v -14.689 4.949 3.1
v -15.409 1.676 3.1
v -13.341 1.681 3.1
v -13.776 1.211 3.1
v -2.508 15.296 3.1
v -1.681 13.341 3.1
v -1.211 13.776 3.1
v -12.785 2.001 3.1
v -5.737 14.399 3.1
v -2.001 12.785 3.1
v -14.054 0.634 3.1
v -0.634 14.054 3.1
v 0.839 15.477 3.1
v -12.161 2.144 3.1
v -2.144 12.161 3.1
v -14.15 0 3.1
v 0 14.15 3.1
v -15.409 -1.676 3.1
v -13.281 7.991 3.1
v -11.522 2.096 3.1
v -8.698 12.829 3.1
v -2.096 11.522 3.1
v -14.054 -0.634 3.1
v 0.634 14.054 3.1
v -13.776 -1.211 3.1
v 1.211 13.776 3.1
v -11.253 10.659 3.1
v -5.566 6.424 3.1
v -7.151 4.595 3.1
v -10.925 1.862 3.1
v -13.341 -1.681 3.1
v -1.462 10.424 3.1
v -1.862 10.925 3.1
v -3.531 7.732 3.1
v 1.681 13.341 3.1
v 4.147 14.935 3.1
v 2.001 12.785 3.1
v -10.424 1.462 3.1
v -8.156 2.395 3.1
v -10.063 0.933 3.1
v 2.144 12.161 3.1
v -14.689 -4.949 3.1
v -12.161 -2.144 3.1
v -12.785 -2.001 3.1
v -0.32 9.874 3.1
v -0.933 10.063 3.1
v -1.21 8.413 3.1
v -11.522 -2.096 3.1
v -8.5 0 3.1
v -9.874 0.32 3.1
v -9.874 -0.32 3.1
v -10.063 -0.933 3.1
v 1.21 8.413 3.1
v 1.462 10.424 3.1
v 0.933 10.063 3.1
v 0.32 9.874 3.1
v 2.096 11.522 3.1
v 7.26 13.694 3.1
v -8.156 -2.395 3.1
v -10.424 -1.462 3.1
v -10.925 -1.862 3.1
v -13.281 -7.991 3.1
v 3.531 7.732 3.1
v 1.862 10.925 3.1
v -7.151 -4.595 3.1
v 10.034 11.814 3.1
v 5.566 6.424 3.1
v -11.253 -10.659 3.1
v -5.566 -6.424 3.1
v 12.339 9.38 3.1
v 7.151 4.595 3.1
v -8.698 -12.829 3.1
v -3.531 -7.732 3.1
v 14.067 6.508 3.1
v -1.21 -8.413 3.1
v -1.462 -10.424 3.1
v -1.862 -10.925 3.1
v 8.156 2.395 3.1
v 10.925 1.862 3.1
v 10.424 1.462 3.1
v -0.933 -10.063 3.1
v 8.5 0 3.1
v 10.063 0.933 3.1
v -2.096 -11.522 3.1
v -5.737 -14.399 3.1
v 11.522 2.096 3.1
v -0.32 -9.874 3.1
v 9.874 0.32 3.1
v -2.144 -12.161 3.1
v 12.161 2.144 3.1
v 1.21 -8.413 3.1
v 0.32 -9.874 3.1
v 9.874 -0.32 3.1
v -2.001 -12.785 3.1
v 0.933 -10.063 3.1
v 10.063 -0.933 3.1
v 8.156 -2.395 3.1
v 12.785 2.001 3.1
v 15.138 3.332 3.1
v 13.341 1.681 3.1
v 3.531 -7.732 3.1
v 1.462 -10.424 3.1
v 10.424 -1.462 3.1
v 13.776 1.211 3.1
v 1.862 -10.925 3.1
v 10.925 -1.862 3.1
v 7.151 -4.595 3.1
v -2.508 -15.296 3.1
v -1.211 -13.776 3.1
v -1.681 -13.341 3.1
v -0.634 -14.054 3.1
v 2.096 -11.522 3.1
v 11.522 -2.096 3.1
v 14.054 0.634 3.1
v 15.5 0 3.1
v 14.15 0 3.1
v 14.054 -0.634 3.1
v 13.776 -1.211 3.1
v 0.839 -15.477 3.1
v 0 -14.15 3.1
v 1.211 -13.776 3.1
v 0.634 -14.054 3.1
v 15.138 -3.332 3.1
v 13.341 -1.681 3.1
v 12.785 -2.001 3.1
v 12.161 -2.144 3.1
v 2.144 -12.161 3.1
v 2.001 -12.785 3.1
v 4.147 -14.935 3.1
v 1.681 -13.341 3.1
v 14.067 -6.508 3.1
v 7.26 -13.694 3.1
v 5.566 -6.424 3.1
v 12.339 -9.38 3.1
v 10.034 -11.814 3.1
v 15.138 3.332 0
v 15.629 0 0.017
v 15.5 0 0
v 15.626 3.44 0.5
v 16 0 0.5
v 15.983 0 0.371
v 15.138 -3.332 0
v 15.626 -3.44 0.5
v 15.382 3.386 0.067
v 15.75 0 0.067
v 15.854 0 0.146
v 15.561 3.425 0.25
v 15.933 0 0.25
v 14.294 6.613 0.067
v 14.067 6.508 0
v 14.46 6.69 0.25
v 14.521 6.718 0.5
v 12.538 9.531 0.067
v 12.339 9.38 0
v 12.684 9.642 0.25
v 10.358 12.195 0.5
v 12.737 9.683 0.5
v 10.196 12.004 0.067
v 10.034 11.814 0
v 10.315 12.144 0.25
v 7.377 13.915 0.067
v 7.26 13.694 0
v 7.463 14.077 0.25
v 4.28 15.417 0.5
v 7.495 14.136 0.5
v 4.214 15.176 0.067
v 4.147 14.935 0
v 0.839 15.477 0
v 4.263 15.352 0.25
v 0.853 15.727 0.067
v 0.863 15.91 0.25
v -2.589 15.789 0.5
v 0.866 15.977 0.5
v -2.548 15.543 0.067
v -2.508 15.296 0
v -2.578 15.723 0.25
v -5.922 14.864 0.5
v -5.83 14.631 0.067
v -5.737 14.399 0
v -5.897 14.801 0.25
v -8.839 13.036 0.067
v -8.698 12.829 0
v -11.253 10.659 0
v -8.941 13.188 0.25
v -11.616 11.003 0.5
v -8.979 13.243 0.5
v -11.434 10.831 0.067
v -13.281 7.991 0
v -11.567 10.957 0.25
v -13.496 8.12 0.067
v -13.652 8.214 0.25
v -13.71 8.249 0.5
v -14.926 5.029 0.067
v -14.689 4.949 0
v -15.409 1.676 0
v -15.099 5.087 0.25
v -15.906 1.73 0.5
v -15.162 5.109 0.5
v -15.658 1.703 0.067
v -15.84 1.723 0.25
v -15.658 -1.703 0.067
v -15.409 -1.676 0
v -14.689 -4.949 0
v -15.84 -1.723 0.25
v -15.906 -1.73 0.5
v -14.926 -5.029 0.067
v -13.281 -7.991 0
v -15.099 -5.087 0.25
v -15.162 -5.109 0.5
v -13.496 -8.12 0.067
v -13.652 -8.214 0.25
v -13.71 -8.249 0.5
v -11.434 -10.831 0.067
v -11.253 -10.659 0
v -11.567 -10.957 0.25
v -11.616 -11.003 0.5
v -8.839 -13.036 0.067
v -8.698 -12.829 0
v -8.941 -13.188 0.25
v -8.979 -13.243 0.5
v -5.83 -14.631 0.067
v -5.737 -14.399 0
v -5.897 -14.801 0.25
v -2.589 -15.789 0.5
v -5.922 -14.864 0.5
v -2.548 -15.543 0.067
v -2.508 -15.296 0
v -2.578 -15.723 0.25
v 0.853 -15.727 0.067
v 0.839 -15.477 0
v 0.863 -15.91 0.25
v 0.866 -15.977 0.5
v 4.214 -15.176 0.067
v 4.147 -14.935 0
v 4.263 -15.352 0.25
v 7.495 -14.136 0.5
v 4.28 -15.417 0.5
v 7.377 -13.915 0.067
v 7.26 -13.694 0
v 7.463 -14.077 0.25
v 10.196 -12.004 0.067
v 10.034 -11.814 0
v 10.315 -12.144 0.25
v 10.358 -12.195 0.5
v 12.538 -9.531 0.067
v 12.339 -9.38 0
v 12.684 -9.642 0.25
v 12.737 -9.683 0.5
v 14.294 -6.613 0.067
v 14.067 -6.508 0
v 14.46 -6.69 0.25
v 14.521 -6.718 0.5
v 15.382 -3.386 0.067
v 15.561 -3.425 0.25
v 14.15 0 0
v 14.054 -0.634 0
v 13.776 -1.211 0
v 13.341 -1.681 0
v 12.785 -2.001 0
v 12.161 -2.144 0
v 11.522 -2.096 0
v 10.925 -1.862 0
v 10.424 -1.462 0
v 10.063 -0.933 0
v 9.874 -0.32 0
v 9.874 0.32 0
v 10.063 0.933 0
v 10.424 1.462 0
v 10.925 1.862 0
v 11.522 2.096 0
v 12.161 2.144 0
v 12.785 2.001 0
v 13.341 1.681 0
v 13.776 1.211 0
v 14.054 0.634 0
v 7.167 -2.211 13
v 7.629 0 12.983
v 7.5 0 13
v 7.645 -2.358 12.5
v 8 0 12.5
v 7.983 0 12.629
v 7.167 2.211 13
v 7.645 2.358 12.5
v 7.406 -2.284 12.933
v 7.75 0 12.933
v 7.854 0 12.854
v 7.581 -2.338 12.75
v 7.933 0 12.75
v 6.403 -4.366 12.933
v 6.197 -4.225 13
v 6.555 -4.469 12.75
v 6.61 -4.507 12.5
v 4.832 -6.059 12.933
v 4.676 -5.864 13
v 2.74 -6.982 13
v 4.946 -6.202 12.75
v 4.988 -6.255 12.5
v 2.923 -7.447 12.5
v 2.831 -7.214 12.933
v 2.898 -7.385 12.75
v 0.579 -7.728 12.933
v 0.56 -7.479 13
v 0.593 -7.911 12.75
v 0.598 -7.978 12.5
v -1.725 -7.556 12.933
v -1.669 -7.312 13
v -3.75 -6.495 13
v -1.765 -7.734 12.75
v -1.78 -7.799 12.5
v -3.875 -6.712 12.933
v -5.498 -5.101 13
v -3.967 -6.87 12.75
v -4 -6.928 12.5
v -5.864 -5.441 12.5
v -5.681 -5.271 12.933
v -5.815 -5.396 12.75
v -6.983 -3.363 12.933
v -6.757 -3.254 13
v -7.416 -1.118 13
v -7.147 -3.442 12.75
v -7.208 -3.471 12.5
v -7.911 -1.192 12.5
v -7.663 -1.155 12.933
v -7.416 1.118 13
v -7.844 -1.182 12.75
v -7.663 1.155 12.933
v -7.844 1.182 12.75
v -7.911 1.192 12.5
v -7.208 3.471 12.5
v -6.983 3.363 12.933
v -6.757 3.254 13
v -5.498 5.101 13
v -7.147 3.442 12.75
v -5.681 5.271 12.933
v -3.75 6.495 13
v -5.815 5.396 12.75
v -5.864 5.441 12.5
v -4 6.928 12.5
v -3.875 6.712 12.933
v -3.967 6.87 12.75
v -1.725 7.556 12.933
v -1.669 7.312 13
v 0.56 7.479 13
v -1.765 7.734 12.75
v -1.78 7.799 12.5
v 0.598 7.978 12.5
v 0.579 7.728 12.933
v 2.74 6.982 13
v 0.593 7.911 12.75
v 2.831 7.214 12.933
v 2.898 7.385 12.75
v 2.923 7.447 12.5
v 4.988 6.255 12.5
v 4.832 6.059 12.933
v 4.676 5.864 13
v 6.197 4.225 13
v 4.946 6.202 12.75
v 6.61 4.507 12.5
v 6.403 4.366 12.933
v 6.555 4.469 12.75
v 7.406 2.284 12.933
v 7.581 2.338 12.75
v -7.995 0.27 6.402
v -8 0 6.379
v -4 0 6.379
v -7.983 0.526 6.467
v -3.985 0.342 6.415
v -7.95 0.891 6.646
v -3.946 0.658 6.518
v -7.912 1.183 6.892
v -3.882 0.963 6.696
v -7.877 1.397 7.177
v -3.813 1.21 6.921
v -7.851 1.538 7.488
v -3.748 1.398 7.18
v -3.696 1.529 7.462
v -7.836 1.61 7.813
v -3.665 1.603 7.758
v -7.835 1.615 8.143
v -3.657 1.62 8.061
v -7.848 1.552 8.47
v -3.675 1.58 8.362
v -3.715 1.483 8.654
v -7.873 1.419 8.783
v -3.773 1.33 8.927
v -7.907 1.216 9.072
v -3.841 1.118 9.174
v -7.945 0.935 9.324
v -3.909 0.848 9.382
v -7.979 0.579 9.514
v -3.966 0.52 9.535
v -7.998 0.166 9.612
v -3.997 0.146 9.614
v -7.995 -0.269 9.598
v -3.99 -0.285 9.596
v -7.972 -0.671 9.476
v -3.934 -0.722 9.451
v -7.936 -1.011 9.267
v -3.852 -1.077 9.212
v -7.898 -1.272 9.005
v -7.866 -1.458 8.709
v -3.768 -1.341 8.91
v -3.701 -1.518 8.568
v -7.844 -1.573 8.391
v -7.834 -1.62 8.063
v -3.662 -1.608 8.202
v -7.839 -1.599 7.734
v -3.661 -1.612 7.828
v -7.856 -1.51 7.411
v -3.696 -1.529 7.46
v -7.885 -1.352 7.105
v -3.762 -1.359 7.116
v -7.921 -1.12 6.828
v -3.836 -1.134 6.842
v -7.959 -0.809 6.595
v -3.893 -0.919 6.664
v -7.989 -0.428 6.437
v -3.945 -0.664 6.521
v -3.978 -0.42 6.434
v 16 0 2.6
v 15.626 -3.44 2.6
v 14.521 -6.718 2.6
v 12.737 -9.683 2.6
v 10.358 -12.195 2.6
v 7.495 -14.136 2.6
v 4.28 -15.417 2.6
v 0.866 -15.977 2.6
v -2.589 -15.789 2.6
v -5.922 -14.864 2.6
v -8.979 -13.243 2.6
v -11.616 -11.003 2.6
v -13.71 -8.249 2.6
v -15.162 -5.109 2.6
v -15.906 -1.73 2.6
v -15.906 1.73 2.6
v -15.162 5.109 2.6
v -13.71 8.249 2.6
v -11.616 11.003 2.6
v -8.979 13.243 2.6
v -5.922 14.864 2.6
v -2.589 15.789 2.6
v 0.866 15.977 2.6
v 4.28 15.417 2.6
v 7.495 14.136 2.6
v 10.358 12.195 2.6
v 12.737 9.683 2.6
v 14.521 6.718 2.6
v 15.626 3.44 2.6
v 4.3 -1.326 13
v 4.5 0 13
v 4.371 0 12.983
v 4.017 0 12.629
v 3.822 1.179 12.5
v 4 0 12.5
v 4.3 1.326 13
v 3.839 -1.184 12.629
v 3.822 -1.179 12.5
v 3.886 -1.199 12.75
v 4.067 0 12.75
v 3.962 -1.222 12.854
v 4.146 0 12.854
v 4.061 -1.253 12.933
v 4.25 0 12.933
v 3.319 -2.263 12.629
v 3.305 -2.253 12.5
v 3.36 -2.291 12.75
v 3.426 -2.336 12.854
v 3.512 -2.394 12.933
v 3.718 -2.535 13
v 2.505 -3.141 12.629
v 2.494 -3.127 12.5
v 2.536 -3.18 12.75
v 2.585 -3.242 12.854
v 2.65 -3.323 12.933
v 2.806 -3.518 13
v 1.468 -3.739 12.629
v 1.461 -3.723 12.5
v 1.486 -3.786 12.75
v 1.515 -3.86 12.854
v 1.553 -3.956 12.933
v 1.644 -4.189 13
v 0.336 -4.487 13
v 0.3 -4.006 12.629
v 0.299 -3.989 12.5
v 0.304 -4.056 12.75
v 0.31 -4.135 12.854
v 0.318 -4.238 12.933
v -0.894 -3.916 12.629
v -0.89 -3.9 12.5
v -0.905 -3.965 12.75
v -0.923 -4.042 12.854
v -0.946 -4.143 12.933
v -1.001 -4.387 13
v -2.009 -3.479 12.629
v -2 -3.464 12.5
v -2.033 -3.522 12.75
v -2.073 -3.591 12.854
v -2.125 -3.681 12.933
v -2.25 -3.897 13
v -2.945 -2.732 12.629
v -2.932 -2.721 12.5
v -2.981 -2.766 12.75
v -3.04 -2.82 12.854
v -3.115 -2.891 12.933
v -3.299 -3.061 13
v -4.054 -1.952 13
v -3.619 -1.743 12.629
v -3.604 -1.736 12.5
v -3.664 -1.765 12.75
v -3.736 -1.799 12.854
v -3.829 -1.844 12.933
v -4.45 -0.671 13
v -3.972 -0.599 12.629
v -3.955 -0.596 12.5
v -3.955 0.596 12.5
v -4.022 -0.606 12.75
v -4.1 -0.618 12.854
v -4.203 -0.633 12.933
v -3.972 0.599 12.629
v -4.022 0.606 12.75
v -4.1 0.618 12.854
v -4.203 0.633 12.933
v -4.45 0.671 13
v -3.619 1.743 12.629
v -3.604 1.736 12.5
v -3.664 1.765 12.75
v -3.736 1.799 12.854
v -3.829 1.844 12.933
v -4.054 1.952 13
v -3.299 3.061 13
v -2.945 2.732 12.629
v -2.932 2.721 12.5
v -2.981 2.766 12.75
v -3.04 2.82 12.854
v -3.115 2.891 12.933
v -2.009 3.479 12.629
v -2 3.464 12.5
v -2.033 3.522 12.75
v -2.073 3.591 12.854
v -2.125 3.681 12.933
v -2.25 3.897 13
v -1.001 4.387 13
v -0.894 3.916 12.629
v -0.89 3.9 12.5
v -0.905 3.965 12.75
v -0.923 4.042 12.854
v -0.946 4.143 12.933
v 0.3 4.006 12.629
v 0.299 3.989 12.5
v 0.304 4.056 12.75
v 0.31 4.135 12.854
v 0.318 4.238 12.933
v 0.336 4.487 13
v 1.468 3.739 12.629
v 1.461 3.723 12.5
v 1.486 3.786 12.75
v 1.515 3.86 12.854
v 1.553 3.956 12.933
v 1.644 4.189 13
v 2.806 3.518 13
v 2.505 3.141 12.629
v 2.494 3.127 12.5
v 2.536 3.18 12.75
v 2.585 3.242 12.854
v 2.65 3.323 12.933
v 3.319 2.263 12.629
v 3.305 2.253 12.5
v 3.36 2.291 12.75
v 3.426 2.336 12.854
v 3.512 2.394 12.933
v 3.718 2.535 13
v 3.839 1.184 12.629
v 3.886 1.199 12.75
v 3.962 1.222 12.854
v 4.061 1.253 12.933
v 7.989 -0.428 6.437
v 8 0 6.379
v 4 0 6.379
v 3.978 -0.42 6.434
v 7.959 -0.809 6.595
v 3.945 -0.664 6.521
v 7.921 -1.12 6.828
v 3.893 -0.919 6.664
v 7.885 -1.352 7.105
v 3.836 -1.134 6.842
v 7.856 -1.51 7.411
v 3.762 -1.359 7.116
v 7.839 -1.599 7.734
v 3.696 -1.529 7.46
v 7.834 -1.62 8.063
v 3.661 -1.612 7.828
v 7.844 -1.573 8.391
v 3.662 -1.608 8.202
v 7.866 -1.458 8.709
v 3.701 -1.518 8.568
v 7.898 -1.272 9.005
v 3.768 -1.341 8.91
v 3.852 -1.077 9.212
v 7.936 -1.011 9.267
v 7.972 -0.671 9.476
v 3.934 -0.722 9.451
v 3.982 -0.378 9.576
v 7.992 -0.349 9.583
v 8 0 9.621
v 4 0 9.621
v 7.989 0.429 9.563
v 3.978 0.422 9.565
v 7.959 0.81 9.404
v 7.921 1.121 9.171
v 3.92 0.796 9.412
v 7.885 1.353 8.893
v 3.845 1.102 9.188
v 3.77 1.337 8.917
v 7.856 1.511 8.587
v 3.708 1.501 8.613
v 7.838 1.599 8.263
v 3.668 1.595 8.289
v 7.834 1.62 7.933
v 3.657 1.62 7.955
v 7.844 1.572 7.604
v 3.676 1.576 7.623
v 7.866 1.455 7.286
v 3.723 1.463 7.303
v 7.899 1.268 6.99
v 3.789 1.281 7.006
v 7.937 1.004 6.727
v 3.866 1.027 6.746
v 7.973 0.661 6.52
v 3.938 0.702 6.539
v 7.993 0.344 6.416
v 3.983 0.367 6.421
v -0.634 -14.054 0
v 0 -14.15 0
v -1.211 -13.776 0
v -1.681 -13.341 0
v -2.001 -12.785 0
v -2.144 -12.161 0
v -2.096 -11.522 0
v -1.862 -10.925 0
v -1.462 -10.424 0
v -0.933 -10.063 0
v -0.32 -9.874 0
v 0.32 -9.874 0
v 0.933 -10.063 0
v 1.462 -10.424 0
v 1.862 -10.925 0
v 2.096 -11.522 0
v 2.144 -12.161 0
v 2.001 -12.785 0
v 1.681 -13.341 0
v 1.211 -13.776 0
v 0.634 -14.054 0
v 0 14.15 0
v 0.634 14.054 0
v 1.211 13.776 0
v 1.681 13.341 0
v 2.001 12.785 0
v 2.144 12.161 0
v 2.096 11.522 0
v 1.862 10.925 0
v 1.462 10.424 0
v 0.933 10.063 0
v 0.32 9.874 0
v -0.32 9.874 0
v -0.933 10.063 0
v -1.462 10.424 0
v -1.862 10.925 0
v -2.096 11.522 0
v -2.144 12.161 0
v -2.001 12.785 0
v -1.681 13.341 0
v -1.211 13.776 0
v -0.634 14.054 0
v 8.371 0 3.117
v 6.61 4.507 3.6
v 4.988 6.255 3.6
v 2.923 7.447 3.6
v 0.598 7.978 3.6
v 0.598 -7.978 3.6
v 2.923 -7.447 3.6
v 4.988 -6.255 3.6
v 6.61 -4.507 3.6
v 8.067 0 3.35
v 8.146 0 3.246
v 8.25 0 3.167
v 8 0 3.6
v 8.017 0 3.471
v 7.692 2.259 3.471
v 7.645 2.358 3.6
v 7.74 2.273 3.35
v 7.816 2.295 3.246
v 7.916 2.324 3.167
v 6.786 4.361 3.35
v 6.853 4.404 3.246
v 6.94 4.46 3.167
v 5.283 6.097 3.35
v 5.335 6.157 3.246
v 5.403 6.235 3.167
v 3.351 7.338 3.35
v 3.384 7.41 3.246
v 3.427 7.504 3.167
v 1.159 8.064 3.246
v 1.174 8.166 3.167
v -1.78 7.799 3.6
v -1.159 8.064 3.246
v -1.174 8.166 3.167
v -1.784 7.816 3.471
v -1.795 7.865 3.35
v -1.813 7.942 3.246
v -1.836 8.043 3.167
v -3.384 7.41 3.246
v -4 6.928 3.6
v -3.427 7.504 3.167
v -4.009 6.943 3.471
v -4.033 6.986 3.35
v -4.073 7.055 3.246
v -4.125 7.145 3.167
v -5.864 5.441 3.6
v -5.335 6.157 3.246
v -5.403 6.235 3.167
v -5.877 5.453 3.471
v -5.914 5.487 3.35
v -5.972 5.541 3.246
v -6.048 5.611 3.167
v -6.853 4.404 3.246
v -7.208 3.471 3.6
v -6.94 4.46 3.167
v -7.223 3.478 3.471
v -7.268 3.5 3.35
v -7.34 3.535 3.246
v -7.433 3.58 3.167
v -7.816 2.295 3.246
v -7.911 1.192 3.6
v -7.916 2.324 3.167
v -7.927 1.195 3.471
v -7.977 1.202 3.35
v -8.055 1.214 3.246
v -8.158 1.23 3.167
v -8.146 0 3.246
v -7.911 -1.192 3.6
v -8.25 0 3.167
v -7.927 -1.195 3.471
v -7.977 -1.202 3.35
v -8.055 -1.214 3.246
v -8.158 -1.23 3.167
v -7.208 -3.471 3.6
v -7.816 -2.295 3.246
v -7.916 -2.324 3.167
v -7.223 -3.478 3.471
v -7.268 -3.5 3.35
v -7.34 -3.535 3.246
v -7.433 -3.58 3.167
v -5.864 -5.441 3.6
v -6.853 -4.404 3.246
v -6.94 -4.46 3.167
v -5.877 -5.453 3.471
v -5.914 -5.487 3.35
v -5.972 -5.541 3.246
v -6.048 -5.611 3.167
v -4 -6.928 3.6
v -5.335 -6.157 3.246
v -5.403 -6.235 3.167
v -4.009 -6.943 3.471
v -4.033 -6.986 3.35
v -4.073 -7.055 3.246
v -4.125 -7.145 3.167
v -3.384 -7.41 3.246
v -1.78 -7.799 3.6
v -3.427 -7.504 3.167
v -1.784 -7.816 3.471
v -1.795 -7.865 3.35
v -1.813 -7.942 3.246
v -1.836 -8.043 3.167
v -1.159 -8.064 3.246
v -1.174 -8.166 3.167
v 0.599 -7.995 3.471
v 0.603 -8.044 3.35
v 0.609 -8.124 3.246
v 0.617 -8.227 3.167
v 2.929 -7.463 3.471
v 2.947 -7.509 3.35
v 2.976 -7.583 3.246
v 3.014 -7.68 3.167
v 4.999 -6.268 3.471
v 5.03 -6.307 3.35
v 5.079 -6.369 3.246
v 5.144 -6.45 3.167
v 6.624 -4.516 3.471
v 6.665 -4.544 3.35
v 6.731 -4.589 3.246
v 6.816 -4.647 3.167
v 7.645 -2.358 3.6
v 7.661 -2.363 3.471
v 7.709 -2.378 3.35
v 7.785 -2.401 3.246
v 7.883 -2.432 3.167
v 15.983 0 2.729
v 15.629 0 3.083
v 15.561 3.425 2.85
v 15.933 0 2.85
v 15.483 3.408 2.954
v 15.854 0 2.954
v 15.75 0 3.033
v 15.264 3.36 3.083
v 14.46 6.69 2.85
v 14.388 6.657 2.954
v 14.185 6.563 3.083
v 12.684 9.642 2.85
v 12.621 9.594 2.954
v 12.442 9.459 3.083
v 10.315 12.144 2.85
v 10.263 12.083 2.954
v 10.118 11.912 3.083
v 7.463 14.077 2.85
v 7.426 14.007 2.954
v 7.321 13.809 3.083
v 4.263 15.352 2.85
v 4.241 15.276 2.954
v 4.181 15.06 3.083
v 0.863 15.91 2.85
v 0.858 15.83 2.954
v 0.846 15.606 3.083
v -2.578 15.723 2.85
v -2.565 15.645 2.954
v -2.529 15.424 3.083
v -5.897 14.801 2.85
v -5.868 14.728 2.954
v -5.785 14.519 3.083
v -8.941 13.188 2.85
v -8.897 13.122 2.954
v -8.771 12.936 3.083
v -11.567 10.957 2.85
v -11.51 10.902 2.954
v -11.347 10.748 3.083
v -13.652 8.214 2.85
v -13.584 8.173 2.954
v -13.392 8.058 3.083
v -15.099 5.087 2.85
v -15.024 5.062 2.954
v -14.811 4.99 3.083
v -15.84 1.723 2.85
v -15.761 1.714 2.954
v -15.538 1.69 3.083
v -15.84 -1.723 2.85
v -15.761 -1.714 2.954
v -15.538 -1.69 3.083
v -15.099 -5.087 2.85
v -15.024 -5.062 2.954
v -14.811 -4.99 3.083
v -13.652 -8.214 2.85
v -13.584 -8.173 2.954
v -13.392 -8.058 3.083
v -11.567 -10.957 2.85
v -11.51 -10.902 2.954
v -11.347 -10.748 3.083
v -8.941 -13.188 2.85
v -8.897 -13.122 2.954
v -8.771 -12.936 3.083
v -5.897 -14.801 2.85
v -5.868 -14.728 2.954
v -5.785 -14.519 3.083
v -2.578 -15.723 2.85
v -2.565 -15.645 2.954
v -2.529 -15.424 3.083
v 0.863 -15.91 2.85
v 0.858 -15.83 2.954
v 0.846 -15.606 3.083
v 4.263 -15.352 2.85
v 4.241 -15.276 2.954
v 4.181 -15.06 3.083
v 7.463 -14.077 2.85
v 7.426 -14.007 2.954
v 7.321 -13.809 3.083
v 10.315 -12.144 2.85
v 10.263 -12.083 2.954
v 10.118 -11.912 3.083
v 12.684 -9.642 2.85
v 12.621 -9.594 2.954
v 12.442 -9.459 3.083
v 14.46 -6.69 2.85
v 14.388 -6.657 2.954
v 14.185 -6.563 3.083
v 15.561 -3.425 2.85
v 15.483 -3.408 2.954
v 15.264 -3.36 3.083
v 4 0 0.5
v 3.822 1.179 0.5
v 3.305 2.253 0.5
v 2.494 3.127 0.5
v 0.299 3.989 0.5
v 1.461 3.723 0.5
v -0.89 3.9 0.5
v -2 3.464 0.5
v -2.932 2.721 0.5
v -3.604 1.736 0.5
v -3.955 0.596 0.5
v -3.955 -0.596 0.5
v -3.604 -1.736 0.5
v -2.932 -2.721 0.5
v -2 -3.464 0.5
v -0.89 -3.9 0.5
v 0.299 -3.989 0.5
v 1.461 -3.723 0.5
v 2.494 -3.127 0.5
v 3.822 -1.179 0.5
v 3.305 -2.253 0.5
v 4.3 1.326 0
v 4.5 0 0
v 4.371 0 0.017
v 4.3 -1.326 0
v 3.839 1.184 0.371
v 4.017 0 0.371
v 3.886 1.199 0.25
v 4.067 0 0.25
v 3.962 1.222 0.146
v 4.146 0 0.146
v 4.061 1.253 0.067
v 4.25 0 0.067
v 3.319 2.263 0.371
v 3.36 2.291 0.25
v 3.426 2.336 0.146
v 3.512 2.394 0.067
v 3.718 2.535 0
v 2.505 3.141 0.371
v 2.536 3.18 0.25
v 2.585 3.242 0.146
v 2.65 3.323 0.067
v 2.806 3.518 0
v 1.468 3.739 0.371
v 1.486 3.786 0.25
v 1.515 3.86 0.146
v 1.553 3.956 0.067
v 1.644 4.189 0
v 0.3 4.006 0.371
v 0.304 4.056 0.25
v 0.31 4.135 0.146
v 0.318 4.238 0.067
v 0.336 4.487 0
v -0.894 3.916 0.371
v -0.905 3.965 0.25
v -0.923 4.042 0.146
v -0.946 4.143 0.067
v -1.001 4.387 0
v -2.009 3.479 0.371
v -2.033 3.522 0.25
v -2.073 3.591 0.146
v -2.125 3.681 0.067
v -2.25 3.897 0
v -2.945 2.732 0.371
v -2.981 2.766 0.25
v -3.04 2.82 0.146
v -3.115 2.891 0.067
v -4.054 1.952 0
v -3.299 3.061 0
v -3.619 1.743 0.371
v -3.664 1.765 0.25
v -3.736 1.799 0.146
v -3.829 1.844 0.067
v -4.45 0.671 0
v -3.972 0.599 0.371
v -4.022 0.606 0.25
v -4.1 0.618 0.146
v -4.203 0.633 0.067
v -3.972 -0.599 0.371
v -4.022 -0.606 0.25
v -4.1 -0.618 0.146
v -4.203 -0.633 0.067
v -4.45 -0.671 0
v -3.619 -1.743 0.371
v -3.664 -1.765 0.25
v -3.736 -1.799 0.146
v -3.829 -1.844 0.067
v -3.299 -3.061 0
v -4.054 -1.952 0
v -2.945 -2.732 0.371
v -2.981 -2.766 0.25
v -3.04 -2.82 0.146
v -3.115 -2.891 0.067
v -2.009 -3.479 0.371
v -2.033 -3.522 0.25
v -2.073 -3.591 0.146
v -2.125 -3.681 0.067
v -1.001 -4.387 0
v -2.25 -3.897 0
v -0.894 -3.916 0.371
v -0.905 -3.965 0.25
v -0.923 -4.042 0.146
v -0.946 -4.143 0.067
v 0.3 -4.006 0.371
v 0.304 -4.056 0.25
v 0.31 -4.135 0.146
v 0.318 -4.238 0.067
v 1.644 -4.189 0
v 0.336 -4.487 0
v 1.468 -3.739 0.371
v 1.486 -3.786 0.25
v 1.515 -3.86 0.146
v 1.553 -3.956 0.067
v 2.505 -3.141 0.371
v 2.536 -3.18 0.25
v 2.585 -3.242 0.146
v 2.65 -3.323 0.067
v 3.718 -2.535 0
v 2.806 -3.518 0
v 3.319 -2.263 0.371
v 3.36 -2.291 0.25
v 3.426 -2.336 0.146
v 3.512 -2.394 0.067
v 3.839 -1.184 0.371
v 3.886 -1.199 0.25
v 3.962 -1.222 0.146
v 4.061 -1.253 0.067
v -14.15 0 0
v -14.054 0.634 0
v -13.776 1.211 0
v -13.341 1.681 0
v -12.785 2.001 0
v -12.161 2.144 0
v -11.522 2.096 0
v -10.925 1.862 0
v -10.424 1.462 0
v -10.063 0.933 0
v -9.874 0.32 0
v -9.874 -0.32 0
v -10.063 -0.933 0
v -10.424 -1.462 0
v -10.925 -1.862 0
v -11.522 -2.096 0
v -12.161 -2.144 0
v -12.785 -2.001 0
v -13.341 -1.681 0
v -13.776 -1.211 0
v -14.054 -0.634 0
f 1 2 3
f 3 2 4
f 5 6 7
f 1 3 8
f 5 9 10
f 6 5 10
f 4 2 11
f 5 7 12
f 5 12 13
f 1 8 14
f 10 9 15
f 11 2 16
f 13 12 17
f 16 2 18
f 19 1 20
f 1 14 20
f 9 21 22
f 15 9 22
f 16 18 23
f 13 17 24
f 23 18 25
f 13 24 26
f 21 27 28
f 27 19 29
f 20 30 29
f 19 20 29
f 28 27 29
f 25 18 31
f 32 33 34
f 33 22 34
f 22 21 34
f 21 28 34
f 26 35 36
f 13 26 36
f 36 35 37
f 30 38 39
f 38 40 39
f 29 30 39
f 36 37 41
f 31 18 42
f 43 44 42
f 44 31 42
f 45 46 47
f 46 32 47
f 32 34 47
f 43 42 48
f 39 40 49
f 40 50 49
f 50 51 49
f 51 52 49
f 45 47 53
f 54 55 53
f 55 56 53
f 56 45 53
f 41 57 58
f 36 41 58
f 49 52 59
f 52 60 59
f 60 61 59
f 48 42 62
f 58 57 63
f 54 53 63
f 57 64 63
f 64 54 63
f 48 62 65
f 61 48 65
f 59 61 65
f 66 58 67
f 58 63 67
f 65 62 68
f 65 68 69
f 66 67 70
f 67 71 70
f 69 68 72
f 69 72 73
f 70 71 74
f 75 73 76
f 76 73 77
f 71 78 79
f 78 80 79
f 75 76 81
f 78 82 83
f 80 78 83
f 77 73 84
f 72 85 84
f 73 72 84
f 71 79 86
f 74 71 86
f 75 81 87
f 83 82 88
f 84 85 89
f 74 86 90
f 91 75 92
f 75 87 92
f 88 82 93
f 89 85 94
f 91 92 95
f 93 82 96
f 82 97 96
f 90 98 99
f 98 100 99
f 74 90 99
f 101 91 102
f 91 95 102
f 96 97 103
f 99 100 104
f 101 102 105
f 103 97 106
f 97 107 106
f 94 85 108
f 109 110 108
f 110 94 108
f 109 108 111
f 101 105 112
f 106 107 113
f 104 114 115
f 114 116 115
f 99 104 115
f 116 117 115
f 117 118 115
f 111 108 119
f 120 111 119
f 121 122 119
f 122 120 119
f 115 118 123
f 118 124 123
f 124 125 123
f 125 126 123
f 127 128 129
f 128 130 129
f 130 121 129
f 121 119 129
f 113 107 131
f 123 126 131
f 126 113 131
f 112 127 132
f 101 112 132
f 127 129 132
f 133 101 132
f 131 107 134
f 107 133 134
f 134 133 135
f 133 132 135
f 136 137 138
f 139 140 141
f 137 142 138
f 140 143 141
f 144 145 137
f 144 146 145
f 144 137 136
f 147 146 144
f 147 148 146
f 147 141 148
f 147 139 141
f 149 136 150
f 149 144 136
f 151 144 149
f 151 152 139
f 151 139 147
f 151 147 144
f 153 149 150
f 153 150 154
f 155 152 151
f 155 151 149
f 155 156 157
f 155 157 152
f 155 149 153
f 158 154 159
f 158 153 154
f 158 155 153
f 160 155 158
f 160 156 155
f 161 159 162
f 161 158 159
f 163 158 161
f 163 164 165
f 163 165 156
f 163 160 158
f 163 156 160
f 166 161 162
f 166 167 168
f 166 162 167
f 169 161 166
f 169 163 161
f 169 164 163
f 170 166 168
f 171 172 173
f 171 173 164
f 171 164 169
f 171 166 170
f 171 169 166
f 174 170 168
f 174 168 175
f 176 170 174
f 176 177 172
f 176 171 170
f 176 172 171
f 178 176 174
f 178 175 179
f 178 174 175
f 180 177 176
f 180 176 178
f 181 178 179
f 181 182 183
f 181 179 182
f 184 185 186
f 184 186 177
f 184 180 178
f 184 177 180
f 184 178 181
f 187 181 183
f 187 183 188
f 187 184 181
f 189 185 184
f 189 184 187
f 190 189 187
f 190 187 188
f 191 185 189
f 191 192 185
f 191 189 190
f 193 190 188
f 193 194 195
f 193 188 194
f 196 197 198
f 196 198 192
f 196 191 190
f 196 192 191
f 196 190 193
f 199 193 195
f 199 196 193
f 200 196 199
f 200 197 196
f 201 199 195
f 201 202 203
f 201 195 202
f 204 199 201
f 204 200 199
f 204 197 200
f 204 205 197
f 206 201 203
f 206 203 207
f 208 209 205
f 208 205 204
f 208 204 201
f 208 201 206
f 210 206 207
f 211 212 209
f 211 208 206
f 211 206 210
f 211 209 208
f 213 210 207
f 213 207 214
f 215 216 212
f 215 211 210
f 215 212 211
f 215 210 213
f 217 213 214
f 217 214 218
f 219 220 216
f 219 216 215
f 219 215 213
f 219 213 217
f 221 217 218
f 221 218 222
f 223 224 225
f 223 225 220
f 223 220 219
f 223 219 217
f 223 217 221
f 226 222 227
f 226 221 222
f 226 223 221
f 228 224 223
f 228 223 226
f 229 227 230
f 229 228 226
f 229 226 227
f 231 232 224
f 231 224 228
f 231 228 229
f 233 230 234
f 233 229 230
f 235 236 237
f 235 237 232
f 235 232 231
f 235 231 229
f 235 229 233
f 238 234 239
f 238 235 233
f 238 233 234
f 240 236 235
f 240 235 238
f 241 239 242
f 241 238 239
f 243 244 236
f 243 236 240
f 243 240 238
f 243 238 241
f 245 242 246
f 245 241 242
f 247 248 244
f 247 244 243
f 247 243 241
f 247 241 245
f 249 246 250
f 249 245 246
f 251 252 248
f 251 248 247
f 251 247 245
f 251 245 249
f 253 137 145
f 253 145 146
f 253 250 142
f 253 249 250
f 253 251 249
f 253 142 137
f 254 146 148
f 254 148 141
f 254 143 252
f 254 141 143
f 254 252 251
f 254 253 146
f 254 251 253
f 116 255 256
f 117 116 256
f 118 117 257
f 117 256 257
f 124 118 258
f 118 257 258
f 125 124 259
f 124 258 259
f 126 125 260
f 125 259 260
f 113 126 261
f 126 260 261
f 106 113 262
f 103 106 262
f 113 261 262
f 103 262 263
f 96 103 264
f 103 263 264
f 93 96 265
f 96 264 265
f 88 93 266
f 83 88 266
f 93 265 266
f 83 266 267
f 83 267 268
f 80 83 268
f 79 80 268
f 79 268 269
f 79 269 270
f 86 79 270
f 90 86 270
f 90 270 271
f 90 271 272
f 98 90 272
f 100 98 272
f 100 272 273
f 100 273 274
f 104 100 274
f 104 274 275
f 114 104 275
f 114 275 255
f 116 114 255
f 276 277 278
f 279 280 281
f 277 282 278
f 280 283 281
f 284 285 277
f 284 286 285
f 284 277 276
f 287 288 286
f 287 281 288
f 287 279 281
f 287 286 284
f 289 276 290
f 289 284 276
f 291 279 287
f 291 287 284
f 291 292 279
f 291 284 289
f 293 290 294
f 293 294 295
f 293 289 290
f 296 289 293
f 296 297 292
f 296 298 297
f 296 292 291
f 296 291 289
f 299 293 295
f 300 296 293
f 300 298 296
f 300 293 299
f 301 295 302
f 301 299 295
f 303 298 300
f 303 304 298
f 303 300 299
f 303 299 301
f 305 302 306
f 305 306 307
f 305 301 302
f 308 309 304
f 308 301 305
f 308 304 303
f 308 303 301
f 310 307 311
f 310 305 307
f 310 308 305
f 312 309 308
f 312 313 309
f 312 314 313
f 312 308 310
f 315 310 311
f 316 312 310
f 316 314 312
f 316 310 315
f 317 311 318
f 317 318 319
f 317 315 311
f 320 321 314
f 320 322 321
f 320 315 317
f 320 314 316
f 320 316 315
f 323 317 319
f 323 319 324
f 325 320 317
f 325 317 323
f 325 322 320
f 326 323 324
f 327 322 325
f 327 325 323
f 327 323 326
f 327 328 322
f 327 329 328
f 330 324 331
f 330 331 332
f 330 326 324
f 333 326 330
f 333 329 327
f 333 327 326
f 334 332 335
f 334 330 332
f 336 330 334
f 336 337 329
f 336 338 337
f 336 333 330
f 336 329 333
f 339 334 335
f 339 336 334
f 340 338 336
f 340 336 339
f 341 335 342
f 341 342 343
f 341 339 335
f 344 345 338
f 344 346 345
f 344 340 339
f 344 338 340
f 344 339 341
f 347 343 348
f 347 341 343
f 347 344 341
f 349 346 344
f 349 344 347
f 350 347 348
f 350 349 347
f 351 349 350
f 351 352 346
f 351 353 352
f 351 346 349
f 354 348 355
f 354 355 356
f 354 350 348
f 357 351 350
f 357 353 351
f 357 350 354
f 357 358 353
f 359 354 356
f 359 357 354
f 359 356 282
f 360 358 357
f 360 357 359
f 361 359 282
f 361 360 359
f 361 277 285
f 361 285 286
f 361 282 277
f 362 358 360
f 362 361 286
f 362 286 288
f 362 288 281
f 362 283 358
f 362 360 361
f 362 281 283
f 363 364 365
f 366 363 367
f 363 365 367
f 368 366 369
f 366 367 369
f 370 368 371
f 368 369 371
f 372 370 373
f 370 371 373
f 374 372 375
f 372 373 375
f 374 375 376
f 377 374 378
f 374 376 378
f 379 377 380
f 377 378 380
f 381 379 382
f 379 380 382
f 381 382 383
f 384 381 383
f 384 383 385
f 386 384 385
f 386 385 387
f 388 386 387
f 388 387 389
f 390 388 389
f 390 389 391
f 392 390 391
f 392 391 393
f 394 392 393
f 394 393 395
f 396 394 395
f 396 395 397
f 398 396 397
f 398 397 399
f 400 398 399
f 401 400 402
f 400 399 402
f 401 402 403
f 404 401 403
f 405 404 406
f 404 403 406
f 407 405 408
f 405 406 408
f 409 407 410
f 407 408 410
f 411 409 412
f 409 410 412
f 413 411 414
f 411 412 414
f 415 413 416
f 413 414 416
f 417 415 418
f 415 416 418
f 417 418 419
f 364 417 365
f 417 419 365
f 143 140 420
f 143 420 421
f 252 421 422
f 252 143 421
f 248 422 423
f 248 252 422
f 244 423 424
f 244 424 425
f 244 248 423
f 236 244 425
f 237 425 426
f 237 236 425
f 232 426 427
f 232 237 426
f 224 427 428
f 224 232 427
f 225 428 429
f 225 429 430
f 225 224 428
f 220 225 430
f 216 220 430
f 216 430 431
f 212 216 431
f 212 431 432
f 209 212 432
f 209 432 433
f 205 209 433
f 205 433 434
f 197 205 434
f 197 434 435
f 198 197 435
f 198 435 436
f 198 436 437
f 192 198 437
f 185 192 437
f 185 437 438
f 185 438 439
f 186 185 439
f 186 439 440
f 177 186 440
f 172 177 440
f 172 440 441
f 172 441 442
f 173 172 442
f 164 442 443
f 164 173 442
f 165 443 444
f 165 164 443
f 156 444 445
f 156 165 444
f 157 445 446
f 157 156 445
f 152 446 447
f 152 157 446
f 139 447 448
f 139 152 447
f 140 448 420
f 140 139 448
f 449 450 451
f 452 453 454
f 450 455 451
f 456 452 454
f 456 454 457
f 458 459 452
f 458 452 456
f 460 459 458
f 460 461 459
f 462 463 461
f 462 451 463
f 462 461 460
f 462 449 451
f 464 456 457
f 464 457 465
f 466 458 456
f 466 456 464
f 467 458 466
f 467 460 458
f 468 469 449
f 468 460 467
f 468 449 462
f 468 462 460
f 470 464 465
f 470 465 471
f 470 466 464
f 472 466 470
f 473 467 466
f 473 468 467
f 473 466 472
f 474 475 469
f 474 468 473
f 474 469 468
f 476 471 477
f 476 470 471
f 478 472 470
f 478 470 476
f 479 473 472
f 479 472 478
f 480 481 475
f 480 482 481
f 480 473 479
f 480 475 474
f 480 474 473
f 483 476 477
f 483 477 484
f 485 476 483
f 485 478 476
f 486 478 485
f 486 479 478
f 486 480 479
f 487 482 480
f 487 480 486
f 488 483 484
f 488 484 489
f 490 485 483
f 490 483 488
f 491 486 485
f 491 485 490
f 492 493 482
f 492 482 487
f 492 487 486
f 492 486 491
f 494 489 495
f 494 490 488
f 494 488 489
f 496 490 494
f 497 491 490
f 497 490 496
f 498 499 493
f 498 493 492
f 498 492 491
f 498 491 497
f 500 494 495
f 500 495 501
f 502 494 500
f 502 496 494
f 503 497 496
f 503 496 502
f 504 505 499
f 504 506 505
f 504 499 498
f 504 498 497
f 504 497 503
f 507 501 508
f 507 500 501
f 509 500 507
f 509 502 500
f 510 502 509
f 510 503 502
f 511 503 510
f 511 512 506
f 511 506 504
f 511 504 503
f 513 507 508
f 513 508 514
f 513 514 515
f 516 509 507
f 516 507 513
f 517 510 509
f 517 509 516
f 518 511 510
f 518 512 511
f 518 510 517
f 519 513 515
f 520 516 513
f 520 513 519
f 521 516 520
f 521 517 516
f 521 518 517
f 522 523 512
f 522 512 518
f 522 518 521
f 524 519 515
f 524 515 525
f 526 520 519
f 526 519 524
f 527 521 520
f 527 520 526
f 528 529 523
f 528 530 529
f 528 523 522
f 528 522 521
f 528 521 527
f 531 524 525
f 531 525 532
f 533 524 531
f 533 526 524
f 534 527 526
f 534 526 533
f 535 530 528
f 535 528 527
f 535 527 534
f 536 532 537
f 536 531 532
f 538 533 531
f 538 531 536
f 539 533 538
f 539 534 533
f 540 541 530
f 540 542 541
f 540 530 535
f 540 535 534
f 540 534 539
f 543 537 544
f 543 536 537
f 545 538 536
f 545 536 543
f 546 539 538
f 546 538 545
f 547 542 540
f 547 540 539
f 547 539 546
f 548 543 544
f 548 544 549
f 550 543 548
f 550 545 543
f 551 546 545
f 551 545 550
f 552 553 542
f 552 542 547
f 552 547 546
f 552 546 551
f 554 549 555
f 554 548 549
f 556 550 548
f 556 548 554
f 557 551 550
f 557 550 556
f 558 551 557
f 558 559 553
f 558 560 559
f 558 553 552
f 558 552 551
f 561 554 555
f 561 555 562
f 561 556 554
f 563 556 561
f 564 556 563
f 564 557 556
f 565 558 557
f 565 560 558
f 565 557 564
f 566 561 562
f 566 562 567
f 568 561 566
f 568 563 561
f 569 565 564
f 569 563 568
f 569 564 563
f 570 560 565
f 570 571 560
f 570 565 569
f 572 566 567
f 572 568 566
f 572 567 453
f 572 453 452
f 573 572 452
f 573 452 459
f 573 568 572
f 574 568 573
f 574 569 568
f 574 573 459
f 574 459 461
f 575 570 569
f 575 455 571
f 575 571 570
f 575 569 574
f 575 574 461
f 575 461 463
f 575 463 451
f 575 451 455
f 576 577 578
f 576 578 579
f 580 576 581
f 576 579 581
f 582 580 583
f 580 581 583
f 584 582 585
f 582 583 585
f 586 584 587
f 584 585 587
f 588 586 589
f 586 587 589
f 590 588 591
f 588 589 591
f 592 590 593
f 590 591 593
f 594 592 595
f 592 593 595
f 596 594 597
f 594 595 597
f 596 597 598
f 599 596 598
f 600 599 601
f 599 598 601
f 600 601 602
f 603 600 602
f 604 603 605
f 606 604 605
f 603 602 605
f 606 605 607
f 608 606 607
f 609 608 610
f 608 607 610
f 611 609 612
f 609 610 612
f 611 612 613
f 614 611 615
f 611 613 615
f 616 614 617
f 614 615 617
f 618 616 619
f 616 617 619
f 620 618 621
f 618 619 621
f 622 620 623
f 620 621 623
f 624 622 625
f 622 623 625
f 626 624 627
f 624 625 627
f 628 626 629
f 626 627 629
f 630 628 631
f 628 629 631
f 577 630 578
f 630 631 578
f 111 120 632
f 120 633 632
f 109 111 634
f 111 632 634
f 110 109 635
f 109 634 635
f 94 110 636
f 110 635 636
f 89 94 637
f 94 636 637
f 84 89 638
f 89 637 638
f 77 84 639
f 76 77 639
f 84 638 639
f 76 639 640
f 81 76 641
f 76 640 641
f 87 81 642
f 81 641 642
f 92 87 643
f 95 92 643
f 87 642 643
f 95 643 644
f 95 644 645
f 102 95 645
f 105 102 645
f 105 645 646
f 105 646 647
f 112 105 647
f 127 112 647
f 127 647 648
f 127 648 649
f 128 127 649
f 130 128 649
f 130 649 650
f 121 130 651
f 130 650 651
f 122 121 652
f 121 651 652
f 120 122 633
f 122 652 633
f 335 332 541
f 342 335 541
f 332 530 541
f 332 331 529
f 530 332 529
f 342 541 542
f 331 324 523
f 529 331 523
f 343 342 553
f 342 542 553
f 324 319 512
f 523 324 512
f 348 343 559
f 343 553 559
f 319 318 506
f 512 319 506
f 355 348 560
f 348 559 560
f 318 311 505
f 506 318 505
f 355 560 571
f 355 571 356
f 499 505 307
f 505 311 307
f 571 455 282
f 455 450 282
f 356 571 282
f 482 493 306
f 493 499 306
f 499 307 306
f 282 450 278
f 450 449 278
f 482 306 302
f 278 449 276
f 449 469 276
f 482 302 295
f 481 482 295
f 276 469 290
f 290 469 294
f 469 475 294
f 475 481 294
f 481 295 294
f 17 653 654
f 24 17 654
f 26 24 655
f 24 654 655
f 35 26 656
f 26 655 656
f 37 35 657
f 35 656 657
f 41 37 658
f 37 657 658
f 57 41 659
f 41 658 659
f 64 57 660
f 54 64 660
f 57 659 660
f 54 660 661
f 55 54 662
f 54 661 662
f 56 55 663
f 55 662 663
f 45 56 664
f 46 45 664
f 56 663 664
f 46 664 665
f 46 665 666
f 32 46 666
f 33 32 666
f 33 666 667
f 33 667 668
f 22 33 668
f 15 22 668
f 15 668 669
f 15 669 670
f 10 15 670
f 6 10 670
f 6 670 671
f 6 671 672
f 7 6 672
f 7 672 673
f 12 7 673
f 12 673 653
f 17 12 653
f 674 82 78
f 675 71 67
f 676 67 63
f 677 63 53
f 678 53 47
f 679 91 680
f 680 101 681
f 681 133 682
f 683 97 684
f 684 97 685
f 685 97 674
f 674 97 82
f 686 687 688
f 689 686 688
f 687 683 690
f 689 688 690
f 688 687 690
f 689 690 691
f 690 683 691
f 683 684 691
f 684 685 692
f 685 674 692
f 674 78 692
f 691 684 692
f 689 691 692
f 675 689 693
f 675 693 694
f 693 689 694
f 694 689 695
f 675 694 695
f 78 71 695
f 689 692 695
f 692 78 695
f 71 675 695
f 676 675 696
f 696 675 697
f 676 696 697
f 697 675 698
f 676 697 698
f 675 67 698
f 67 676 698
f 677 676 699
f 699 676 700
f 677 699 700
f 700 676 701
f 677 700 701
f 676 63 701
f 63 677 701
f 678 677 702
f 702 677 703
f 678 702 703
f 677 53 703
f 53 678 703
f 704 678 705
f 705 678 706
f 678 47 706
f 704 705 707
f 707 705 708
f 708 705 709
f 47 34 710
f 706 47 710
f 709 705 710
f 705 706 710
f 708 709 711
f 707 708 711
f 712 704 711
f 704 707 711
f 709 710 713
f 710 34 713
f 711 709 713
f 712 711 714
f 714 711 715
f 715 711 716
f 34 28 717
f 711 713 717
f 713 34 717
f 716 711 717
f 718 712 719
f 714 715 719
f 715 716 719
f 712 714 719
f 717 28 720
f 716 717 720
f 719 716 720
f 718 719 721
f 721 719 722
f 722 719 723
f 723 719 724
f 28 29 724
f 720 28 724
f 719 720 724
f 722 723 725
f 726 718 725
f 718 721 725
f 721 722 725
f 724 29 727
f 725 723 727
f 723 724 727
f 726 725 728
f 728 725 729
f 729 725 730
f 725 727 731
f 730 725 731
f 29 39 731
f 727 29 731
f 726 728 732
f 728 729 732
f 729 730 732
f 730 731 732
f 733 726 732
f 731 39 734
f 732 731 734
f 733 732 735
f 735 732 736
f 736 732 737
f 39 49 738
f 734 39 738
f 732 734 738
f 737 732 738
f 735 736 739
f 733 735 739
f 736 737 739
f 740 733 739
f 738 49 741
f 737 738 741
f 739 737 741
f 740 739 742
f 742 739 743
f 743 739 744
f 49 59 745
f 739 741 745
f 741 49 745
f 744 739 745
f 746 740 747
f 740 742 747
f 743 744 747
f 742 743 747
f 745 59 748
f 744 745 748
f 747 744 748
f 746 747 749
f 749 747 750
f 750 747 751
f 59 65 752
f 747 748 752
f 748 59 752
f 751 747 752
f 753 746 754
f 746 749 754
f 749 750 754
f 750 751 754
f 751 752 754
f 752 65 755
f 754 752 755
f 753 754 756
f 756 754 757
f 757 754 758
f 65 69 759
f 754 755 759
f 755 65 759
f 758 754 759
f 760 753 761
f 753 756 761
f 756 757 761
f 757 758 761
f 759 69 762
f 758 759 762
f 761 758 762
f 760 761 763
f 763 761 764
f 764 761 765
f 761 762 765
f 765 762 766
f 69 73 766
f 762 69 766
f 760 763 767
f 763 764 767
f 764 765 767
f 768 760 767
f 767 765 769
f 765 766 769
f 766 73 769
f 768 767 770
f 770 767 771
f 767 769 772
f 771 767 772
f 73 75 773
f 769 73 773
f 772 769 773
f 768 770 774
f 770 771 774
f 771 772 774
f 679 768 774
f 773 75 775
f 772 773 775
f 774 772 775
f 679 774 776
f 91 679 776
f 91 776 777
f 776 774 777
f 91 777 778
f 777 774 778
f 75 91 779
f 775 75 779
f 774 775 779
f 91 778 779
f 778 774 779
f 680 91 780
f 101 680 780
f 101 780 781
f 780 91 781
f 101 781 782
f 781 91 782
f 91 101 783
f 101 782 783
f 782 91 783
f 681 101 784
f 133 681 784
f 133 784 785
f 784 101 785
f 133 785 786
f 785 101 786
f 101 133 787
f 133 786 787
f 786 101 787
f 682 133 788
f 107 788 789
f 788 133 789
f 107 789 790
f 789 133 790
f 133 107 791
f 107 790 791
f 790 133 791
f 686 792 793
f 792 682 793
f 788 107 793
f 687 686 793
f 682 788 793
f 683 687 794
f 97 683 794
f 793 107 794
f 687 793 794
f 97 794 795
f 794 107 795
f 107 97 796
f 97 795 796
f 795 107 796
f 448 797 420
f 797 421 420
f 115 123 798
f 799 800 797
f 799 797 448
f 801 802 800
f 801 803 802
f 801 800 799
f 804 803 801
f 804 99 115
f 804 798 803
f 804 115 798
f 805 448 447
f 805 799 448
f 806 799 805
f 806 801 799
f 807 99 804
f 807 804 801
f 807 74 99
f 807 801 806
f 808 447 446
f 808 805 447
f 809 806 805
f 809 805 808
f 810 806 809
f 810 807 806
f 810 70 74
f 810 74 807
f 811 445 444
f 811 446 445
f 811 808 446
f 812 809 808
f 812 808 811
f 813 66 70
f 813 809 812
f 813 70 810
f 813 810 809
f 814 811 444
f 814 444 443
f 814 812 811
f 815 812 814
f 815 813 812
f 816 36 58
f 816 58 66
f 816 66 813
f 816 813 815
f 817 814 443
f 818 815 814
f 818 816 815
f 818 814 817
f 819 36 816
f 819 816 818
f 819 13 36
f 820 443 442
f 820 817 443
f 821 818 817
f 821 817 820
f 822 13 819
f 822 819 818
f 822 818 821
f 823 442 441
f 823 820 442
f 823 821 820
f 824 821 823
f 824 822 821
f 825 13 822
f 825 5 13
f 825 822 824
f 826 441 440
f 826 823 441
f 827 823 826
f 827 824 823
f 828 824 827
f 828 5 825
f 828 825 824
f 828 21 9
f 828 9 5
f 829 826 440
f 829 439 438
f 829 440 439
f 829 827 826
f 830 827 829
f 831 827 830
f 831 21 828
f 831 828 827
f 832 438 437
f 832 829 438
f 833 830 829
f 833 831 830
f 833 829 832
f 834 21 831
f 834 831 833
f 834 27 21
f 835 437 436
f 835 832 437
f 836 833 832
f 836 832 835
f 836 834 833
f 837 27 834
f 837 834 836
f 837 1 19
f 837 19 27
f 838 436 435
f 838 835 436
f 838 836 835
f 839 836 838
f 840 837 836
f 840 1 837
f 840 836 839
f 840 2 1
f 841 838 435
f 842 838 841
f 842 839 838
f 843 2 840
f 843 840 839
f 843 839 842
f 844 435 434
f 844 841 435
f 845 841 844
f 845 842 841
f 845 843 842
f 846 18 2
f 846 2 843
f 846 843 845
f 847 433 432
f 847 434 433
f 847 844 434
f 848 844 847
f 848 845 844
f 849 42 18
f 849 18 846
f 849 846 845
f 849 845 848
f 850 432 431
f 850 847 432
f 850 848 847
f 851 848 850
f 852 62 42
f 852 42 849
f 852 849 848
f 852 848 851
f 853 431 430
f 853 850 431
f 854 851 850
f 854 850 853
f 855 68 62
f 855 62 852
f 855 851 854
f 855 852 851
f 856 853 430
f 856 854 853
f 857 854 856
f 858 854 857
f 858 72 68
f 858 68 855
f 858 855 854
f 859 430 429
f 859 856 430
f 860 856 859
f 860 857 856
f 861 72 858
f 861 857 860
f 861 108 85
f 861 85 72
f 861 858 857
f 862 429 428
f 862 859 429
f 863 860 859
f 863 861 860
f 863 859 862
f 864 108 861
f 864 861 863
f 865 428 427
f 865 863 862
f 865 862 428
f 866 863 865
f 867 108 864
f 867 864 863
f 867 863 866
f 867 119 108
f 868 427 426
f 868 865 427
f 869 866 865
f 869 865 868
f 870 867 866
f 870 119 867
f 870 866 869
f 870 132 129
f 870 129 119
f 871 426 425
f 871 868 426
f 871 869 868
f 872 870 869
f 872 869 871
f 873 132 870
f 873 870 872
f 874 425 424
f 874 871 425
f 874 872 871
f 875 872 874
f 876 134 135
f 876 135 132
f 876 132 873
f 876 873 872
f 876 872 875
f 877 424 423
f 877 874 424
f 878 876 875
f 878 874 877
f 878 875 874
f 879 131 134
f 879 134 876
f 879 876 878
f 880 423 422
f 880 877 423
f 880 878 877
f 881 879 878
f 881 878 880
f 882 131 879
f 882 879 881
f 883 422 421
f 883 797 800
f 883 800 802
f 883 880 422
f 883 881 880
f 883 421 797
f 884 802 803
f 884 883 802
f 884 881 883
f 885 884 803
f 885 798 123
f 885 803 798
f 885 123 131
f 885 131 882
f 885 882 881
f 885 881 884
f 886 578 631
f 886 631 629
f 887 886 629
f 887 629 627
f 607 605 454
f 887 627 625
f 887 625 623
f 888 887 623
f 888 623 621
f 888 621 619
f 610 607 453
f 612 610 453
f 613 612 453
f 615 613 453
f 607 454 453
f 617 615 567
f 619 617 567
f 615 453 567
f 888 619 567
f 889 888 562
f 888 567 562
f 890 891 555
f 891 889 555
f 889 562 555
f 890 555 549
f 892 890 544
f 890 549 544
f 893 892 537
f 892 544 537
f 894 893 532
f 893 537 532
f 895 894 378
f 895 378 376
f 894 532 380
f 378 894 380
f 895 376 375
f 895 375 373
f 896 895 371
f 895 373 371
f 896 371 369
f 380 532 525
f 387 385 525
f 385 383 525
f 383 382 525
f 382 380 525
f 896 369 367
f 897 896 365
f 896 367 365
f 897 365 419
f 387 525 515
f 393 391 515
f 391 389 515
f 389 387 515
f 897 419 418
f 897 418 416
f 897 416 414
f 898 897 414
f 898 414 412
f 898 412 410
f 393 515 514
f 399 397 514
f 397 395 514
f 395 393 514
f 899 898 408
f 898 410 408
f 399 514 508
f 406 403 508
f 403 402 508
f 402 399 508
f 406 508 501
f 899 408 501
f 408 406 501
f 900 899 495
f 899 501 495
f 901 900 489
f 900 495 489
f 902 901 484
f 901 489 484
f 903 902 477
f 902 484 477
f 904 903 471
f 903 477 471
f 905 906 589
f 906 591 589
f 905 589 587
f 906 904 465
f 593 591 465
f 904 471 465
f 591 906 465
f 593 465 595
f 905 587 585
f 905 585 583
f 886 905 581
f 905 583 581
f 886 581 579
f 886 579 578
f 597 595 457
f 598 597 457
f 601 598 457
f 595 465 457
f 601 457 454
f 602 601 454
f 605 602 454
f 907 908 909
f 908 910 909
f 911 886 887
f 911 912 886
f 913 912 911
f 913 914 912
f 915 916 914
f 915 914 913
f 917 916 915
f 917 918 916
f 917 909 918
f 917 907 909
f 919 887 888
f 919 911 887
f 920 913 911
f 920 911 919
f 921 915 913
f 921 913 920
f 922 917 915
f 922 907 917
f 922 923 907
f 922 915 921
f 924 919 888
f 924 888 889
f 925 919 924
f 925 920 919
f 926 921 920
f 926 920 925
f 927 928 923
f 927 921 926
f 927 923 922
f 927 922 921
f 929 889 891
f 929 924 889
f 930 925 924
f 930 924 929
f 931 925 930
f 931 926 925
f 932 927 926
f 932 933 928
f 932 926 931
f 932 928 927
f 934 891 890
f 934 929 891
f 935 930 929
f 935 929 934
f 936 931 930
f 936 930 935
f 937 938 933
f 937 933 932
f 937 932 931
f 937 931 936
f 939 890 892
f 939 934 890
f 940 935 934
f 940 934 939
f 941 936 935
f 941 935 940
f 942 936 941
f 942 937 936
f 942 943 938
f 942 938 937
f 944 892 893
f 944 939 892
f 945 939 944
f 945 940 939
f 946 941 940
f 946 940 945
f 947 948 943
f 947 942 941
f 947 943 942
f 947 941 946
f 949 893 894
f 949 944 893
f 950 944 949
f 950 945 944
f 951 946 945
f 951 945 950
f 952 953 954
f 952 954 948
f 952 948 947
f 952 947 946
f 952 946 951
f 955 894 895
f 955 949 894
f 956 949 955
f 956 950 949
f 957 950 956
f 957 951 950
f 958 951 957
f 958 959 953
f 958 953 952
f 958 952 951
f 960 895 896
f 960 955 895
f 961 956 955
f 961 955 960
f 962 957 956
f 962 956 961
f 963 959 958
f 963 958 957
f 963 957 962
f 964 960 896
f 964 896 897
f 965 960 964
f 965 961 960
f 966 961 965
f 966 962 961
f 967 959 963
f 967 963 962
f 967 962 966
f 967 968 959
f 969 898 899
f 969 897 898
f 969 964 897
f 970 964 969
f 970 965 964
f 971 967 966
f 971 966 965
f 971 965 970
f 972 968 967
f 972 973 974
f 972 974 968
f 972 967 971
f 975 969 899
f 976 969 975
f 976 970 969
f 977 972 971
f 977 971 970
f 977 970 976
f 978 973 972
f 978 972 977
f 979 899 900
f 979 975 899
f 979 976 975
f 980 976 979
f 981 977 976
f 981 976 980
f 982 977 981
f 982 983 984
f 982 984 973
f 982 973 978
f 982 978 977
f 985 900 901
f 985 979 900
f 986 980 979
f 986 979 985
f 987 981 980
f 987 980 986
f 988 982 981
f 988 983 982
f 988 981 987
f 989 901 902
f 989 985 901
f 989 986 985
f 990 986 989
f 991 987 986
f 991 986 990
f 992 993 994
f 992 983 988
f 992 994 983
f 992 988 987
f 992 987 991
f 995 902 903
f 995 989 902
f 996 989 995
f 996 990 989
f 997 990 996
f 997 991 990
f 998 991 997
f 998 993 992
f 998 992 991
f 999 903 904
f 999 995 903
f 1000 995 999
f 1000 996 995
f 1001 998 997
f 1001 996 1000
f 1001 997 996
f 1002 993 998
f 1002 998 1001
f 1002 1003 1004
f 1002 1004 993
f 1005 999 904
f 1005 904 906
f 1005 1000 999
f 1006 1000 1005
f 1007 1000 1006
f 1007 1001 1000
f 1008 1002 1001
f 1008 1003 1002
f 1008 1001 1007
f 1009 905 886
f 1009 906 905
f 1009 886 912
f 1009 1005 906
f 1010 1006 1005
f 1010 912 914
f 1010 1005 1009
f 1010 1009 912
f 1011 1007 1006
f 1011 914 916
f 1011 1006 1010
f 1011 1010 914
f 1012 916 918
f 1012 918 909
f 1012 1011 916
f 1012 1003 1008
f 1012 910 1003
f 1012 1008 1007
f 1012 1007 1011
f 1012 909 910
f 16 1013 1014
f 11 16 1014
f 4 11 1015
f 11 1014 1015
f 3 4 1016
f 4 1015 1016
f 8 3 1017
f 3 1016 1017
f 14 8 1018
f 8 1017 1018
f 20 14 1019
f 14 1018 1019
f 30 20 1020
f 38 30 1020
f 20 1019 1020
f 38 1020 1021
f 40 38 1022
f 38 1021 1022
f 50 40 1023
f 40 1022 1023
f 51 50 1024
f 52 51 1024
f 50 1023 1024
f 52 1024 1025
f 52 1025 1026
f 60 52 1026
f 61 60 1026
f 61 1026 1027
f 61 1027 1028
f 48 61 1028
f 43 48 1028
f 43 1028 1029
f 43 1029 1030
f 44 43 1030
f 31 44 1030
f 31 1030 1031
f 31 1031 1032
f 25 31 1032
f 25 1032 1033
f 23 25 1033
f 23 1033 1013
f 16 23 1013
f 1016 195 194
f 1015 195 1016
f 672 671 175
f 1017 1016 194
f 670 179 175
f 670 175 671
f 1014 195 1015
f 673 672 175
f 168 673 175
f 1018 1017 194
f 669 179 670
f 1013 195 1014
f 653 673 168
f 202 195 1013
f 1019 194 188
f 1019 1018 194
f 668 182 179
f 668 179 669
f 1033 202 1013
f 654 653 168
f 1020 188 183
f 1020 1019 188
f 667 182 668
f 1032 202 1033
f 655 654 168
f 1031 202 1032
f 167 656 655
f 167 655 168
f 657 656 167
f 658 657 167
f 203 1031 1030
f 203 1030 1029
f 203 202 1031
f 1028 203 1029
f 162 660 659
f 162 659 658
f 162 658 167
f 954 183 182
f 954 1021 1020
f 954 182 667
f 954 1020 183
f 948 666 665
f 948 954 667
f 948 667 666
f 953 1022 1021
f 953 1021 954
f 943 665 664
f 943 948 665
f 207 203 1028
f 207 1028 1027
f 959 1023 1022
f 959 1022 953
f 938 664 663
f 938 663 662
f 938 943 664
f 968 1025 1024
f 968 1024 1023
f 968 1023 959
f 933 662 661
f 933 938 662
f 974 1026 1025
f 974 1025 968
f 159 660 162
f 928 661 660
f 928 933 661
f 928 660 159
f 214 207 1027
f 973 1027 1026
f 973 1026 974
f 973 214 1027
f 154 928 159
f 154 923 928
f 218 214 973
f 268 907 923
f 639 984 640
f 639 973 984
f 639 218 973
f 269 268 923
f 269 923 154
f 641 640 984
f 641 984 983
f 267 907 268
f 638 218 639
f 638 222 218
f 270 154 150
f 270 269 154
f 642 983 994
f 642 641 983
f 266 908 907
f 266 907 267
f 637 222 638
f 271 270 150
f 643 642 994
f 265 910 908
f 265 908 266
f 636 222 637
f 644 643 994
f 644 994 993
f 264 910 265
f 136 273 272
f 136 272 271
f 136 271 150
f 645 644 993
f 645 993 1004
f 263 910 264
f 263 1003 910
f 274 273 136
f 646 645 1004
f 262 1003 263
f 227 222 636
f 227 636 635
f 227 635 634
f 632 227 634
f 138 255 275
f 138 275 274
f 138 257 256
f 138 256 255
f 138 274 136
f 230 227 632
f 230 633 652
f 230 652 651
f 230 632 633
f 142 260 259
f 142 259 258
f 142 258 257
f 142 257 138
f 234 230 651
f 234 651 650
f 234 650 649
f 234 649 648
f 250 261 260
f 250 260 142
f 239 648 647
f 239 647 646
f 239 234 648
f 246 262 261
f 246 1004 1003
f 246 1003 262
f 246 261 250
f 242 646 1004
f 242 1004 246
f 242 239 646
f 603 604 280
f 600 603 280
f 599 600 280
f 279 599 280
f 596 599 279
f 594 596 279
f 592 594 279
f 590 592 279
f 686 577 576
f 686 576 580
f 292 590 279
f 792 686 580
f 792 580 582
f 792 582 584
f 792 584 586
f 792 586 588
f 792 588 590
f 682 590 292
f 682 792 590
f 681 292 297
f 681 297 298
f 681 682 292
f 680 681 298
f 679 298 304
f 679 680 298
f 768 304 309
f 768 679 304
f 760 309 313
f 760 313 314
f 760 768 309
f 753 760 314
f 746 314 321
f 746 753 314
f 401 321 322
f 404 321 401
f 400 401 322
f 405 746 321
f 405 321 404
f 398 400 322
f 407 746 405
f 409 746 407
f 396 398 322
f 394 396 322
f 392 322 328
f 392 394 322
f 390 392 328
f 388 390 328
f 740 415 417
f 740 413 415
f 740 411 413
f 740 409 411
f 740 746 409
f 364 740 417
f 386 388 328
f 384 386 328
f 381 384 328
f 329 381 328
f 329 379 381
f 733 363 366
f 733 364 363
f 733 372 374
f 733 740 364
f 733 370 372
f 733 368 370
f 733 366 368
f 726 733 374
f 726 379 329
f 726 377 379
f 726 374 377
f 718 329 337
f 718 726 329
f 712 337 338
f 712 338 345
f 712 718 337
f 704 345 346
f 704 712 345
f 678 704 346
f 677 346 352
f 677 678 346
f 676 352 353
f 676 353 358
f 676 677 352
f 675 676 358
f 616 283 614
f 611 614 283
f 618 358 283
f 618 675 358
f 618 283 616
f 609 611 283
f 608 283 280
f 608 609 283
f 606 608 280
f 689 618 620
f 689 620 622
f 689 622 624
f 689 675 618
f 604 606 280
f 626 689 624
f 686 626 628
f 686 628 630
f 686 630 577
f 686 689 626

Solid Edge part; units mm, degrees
sketch "Sketch1" plane through (0, 0, 0) normal (0, -1, 0) x (1, 0, 0)
  line L0 (4, 0) -> (4, 13)
  line L1 (4, 13) -> (8, 13)
  line L2 (8, 13) -> (8, 3.1)
  line L3 (8, 3.1) -> (16, 3.1)
  line L4 (16, 3.1) -> (16, 0)
  line L5 (16, 0) -> (4, 0)
  dimension "D1" = 3.1
  dimension "D2" = 13
revolve "RevolvedProtrusion1" add sketch "Sketch1" angle 360 about axis through (0, 0, 54) along (0, 0, -1)
hole "mounting_hole" at (0, 12, 0) direction (0, 0, 1) diameter 4.3 end up to next
pattern_circular "Pattern1" count 4 over 360 about axis through (0, 0, 3.1) along (0, 0, 1) of "mounting_hole"
fillet "Round1" radius 0.5 6 edges at (-8, 0, 13) (-4, 0, 13) (-8, 0, 3.1) (-16, 0, 3.1) (-16, 0, 0) (-4, 0, 0)
hole "worm_screw_hole" at (0, 0, 8) direction (-1, 0, 0) diameter 3.242 end up to next
mirror "Mirror1" about plane through (0, 0, 0) normal (1, 0, 0) of "worm_screw_hole"
properties part number "A2.N1" material "X5CrNi18-8"
